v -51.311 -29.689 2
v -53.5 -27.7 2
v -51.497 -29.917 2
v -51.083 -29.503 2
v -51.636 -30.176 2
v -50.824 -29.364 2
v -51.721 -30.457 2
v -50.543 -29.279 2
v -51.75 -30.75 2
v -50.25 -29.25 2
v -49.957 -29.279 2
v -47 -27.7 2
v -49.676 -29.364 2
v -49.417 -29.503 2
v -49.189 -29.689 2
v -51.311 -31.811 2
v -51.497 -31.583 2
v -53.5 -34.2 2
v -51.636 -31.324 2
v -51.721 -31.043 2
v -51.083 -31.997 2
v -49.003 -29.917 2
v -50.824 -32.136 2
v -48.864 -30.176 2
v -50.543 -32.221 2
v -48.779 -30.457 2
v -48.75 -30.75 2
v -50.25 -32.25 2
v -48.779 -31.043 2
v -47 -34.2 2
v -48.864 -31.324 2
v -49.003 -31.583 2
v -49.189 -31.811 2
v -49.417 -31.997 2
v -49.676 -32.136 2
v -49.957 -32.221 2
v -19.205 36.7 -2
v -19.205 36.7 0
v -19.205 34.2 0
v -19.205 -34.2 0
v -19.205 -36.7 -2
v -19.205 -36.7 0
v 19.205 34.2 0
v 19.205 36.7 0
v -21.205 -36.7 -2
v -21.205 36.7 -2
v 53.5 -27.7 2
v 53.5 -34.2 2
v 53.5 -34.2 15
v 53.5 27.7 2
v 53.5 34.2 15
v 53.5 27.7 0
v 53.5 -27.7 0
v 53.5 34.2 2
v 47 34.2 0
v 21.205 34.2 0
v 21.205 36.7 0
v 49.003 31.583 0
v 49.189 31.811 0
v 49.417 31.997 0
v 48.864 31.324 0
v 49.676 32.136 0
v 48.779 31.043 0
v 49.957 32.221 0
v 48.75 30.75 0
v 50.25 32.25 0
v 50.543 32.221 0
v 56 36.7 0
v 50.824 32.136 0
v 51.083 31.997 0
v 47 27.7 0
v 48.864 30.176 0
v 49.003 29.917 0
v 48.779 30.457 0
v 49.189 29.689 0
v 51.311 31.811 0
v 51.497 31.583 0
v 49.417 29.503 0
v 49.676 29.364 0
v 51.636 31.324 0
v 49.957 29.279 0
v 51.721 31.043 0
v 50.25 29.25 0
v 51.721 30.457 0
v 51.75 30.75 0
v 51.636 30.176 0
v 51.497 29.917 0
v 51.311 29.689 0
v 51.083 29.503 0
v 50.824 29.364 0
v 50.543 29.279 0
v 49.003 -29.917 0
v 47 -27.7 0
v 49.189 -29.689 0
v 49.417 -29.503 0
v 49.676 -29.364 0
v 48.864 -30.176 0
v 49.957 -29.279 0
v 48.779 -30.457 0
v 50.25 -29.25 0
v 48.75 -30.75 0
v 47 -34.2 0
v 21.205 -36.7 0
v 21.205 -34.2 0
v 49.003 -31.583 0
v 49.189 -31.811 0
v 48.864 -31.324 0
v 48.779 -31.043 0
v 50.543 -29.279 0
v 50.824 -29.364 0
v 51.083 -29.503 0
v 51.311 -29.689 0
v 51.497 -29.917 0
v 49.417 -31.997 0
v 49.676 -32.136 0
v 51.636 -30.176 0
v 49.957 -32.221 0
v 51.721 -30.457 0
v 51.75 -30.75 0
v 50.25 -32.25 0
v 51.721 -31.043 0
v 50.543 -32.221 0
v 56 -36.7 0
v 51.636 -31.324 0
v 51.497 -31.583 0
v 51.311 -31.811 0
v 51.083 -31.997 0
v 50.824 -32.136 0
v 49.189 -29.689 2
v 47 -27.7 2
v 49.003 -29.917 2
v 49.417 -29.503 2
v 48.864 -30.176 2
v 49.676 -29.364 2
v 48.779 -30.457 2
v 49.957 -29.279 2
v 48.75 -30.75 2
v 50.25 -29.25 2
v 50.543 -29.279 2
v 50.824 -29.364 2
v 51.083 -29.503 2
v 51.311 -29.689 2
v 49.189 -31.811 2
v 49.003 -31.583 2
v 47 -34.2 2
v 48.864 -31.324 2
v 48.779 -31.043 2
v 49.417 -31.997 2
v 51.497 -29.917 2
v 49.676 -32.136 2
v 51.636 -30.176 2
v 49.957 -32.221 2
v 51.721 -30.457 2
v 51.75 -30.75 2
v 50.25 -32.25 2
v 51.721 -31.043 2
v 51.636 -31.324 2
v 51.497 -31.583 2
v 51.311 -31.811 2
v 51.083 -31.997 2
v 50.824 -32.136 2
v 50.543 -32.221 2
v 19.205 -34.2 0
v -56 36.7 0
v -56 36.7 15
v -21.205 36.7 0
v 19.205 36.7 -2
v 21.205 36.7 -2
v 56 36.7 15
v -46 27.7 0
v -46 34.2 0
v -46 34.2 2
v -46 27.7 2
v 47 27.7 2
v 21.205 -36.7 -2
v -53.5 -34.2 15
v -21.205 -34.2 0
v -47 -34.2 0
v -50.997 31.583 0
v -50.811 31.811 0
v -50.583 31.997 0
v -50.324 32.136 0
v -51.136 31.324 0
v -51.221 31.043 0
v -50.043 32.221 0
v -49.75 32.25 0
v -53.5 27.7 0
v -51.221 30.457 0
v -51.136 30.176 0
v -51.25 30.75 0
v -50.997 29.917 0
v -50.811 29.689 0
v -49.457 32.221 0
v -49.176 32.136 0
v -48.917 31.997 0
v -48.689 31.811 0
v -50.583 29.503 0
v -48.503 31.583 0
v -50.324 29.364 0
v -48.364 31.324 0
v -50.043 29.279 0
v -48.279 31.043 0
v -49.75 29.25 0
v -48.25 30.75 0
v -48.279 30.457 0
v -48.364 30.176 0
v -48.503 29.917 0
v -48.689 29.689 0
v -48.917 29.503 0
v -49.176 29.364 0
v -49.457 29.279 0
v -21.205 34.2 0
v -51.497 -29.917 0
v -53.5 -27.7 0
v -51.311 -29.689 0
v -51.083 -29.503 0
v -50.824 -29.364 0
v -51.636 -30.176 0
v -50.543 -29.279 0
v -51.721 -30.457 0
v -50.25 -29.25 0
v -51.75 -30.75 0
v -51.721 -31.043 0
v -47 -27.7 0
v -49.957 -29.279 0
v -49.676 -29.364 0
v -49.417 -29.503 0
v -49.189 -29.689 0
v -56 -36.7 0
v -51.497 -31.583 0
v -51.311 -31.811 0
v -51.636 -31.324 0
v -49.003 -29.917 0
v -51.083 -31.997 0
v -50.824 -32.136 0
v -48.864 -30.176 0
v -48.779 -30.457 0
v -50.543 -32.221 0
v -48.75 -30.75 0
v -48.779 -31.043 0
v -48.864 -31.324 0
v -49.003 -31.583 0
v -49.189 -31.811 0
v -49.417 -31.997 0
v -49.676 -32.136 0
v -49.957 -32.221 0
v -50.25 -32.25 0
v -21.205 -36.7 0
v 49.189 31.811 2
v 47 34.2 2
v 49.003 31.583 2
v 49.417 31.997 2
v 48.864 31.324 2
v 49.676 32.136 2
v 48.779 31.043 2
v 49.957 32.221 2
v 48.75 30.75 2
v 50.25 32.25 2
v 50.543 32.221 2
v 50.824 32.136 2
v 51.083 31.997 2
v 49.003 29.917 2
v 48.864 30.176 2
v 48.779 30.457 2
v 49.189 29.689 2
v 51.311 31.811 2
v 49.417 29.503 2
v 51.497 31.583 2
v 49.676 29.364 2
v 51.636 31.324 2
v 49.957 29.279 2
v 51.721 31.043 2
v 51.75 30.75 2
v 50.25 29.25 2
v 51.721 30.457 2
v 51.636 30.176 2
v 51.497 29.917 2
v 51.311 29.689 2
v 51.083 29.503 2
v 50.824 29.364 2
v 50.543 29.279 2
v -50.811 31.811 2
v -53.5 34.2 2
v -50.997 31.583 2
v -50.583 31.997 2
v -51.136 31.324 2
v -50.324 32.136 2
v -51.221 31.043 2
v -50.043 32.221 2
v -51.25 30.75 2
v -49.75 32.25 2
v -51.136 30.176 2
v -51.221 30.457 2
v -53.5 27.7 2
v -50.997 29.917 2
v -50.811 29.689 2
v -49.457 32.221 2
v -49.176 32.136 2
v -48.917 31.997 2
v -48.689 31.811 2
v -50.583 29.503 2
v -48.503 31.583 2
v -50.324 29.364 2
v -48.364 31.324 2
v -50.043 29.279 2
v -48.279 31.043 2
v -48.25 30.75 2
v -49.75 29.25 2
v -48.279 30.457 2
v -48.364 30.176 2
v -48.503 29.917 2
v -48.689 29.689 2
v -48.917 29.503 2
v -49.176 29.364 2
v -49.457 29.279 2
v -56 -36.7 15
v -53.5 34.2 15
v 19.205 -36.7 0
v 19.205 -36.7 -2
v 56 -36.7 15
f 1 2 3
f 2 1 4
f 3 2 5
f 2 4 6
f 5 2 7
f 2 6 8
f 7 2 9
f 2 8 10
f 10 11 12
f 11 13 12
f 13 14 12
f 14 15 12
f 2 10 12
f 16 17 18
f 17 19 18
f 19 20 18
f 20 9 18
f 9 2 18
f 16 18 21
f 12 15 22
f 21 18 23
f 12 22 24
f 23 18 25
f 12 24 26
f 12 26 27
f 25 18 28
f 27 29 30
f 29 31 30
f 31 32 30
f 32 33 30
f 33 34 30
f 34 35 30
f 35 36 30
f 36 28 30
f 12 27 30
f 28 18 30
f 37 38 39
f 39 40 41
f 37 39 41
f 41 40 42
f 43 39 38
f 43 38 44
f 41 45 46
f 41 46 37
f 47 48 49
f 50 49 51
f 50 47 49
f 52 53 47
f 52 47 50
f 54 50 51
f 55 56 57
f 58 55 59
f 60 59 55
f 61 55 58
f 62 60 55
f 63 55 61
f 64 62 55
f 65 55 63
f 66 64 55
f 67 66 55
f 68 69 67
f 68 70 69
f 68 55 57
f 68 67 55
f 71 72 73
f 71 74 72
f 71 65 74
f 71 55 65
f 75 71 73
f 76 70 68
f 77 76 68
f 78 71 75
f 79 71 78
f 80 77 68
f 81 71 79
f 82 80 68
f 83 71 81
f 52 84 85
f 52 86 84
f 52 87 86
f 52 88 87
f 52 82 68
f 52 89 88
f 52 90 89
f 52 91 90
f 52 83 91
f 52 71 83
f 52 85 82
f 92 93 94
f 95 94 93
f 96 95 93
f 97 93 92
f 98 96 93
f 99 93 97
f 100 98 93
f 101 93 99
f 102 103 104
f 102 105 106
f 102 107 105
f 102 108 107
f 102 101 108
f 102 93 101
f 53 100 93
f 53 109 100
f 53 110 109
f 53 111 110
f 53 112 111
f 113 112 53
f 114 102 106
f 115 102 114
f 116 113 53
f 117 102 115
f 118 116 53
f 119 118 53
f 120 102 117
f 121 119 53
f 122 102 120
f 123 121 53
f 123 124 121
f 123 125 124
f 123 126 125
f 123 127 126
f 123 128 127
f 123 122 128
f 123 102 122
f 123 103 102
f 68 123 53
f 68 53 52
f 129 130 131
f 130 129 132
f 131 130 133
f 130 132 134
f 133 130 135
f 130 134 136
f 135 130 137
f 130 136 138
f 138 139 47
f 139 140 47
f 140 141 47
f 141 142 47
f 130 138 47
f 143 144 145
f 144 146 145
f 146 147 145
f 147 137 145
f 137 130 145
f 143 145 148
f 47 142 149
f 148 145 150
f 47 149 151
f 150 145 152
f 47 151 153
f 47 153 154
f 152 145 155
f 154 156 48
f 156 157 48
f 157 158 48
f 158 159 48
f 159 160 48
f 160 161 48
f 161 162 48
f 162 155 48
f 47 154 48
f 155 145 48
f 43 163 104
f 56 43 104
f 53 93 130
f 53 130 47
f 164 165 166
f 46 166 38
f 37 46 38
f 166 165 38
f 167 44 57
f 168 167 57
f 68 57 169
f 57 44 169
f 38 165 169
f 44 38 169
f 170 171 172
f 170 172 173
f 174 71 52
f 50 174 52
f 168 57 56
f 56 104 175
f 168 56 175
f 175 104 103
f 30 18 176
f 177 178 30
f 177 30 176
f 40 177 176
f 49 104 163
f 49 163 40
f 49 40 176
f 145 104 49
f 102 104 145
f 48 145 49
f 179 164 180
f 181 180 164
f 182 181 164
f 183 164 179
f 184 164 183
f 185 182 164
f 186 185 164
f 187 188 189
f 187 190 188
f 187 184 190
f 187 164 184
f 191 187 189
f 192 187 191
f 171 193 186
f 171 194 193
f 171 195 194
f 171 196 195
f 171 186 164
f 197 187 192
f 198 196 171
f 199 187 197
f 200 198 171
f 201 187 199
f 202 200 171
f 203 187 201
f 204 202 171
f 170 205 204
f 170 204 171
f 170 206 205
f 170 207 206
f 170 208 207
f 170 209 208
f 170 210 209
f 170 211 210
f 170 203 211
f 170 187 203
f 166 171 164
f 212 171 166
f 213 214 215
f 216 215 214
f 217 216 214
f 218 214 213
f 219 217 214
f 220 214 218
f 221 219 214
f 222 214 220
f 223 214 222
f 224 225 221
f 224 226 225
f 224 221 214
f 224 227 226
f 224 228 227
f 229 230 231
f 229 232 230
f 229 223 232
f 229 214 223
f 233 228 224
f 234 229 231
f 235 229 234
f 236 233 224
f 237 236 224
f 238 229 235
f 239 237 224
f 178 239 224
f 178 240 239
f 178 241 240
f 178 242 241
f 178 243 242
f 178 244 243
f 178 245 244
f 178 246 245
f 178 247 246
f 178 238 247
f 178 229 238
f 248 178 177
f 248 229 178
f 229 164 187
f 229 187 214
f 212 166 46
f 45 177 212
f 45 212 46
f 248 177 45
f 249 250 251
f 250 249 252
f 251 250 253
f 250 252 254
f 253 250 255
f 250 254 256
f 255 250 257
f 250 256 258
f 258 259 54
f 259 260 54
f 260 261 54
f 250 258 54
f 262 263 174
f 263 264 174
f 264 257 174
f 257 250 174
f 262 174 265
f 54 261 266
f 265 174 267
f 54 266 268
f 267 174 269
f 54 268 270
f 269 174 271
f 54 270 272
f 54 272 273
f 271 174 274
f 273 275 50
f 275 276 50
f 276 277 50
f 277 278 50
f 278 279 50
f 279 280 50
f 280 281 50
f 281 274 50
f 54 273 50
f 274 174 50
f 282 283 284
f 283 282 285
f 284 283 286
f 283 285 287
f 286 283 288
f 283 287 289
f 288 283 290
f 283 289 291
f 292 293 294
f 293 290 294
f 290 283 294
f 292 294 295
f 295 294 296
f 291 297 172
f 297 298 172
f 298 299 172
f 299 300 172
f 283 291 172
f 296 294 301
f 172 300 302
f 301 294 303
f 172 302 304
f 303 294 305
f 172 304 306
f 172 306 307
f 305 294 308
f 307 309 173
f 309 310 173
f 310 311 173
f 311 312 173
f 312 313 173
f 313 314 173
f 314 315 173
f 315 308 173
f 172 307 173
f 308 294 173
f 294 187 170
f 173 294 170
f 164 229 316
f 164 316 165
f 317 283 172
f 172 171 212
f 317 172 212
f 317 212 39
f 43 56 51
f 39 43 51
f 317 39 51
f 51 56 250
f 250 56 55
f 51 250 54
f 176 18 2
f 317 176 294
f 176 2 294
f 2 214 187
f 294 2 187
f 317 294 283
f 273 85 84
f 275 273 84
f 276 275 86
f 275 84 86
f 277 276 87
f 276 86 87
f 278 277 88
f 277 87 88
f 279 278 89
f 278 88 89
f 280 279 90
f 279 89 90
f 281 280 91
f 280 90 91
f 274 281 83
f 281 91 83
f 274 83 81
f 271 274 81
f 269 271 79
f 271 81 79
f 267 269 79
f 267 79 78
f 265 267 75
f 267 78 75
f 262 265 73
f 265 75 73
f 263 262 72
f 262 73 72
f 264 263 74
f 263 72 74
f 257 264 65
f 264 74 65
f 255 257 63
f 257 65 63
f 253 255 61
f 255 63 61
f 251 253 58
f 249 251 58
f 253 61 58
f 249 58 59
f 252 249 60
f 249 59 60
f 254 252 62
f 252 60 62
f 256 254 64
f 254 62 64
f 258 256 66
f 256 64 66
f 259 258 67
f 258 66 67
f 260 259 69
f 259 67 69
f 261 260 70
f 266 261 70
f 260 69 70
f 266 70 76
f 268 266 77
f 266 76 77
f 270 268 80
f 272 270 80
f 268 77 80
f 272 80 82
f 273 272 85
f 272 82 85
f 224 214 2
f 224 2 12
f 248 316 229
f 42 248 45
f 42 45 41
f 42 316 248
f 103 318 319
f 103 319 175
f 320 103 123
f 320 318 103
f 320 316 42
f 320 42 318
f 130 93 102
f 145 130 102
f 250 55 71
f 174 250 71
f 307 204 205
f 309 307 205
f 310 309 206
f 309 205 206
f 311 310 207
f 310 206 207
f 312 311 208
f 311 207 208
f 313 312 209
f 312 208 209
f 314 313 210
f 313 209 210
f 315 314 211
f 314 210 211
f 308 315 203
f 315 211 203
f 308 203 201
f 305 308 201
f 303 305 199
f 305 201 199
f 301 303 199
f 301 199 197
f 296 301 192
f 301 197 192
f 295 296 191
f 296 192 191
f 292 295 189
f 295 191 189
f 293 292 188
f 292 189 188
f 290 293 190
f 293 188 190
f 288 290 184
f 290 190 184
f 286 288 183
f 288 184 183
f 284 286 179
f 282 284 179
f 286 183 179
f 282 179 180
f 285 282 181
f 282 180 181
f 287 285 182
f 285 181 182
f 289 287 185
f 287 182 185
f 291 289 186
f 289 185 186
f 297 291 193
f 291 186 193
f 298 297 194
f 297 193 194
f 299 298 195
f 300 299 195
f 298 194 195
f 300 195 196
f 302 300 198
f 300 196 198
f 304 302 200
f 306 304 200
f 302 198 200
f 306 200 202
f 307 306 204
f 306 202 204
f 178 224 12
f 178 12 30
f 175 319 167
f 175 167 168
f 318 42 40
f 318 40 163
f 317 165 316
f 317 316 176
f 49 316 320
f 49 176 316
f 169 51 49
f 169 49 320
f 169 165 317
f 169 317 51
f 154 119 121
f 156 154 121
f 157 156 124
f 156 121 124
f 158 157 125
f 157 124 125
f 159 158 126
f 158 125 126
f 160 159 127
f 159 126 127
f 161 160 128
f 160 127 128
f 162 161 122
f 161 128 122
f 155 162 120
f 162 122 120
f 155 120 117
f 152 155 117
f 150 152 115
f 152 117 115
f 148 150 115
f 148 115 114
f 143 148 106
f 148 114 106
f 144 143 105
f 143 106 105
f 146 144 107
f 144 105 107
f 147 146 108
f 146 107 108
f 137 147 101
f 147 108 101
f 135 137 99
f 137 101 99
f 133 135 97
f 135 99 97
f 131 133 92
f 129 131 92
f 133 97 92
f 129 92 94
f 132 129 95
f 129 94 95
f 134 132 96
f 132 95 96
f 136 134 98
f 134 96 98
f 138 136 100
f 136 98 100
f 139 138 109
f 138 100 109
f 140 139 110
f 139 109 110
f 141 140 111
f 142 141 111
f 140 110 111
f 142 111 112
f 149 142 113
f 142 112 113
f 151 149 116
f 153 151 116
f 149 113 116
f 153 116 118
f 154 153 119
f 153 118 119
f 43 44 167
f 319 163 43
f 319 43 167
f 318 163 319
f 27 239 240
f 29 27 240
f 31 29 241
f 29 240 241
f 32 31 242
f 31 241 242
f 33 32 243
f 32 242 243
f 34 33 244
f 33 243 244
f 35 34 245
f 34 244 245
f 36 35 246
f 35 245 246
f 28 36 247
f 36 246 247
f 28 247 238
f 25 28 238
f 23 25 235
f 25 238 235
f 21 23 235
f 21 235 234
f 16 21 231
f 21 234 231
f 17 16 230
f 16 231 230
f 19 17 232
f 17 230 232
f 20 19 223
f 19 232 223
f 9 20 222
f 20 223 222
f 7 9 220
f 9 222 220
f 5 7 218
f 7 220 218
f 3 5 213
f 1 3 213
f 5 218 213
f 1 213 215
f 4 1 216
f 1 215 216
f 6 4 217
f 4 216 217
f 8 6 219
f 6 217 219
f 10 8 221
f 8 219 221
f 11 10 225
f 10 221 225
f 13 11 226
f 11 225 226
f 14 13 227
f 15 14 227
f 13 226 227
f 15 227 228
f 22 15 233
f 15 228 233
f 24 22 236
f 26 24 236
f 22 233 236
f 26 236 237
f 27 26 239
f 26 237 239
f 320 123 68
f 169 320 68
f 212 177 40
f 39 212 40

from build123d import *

# Parameters (mm, degrees)
SKETCH_W      = 112
SKETCH_H      = 73.4
SKETCH_W_2    = 107
SKETCH_H_2    = 68.4
PAD_DEPTH     = 15
SKETCH001_W   = 6.5
SKETCH001_H   = 6.5
SKETCH001_W_2 = 7.5
PAD001_DEPTH  = 2
SKETCH002_R   = 1.5
POCKET_DEPTH  = 2
SKETCH003_W   = 2
SKETCH003_H   = 73.4
PAD002_DEPTH  = 2


with BuildPart() as part:
    # Sketch → Pad (new body)
    with BuildSketch(Plane.XY):
        Rectangle(SKETCH_W, SKETCH_H)
        Rectangle(SKETCH_W_2, SKETCH_H_2, mode=Mode.SUBTRACT)
    extrude(amount=PAD_DEPTH)

    # Sketch001 (on Face9 of Pad) → Pad001 (join)
    with BuildSketch(Plane(origin=(0, 0, 0), x_dir=(1, 0, 0), z_dir=(0, 0, -1))):
        with Locations((-50.25, 30.95)):
            Rectangle(SKETCH001_W, SKETCH001_H)
        with Locations((-49.75, -30.95)):
            Rectangle(SKETCH001_W_2, SKETCH001_H)
        with Locations((50.25, 30.95)):
            Rectangle(SKETCH001_W, SKETCH001_H)
        with Locations((50.25, -30.95)):
            Rectangle(SKETCH001_W, SKETCH001_H)
    extrude(amount=-PAD001_DEPTH)

    # Sketch002 (on Face22 of Pad001) → Pocket (cut)
    with BuildSketch(Plane(origin=(0, 0, 0), x_dir=(1, 0, 0), z_dir=(0, 0, -1))):
        with Locations((-50.25, 30.75)):
            Circle(SKETCH002_R)
        with Locations((50.25, -30.75)):
            Circle(SKETCH002_R)
        with Locations((-49.75, -30.75)):
            Circle(SKETCH002_R)
        with Locations((50.25, 30.75)):
            Circle(SKETCH002_R)
    extrude(amount=-POCKET_DEPTH, mode=Mode.SUBTRACT)

    # Sketch003 (on Face9 of Pad) → Pad002 (join)
    with BuildSketch(Plane(origin=(0, 0, 0), x_dir=(1, 0, 0), z_dir=(0, 0, -1))):
        with Locations((-20.205, 0)):
            Rectangle(SKETCH003_W, SKETCH003_H)
        with Locations((20.205, 0)):
            Rectangle(SKETCH003_W, SKETCH003_H)
    extrude(amount=PAD002_DEPTH)


solid = part.part
